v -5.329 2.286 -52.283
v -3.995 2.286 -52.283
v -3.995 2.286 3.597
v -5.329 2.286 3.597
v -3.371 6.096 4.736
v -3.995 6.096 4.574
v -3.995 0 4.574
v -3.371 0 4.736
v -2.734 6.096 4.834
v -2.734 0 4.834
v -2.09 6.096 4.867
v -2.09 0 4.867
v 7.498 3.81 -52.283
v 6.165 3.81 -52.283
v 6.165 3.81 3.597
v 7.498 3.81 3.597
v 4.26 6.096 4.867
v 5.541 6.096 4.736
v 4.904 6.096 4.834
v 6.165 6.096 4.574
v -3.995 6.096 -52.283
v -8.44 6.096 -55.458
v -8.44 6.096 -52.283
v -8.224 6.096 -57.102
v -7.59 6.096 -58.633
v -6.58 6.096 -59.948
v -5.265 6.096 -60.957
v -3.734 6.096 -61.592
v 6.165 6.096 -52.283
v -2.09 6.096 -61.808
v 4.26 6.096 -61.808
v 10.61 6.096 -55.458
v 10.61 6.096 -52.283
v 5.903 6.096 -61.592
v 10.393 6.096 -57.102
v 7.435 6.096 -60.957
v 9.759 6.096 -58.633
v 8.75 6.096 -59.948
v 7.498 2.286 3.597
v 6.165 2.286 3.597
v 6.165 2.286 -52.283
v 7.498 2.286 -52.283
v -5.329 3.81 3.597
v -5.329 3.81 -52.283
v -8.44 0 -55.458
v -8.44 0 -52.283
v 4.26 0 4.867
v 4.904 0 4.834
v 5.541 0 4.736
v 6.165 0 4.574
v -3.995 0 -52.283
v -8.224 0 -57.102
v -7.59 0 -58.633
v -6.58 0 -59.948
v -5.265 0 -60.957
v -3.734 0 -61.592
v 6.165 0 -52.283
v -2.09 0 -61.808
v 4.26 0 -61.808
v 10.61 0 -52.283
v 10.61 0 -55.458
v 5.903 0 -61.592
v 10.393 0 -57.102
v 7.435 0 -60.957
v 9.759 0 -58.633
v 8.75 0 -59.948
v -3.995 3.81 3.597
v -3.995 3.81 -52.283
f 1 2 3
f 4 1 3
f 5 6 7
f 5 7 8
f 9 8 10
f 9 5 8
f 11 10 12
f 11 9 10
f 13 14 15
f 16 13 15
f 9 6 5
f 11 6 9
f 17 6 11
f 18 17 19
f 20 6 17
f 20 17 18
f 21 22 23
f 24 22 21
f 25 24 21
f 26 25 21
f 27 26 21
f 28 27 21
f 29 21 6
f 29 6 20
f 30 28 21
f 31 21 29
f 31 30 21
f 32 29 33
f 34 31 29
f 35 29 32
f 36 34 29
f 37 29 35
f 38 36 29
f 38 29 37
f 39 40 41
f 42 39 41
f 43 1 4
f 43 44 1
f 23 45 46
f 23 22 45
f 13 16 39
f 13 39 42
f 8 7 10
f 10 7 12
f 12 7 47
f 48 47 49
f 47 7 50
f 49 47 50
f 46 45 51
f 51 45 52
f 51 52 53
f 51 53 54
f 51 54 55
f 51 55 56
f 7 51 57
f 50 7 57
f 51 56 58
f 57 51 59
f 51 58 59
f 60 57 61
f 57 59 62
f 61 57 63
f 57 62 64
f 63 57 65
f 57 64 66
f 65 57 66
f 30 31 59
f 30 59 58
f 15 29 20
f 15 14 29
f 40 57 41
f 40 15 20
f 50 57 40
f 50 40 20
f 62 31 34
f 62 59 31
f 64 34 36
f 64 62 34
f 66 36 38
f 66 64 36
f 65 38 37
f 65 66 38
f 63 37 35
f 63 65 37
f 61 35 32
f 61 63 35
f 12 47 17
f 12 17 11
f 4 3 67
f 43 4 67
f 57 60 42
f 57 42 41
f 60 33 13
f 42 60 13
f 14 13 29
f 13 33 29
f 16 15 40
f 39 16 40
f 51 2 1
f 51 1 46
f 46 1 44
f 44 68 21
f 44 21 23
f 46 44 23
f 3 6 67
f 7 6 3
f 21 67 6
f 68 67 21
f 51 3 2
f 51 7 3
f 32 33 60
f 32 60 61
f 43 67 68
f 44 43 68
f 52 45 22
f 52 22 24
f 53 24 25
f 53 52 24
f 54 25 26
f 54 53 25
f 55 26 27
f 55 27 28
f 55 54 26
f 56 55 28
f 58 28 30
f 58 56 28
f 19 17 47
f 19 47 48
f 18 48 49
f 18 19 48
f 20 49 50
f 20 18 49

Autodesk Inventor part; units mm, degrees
ref_plane "YZ Plane" through (0, 0, 0) normal (1, 0, 0) x (0, 1, 0)
ref_plane "XZ Plane" through (0, 0, 0) normal (0, 1, 0) x (-1, 0, 0)
ref_plane "XY Plane" through (0, 0, 0) normal (0, 0, 1) x (1, 0, 0)
sketch "Sketch1" plane through (0, 0, 0) normal (0, 1, 0) x (-1, 0, 0)
  line L0 (-6.1647, 4.8669) -> (3.9953, 4.8669)
  line L1 (3.9953, 4.8669) -> (3.9953, -52.2831)
  line L2 (3.9953, -52.2831) -> (-6.1647, -52.2831)
  line L3 (-6.1647, -52.2831) -> (-6.1647, 4.8669)
  point P0 (0, 0)
  dimension "d0" = 10.16
  dimension "d1" = 57.15
extrude "Extrusion1" add sketch "Sketch1" along normal blind 6.096
sketch "Sketch2" plane through (6.1647, 0, 4.8669) normal (1, 0, 0) x (0, 0, -1)
  point P0 (4.8669, 0)
sketch "Sketch3" plane through (6.1647, 0, 4.8669) normal (1, 0, 0) x (0, 0, -1)
  line L0 (0, 0) -> (0, 6.096) projected
  line L1 (0, 2.286) -> (57.15, 2.286)
  line L2 (57.15, 2.286) -> (57.15, 3.81)
  line L3 (57.15, 3.81) -> (0, 3.81)
  line L4 (0, 3.81) -> (0, 2.286)
  line L5 (57.15, 0) -> (0, 0) projected
  point P0 (4.8669, 0)
  dimension "d4" = 1.524
  dimension "d5" = 57.15
  dimension "d6" = 2.286
extrude "Extrusion2" add sketch "Sketch3" along normal blind 1.3335
ref_plane "Work Plane1" through (1.0847, 6.096, 4.8669) normal (1, 0, 0) x (0, 0, -1)
mirror "Mirror1" about plane through (1.0847, 6.096, 4.8669) normal (1, 0, 0) of "Extrusion2"
sketch "Sketch4" plane through (6.1647, 0, -52.2831) normal (0, 0, -1) x (-1, 0, 0)
  line L0 (-4.445, 0) -> (14.605, 0)
  line L1 (14.605, 0) -> (14.605, 6.096)
  line L2 (14.605, 6.096) -> (-4.445, 6.096)
  line L3 (-4.445, 6.096) -> (-4.445, 0)
  line L4 (11.4935, 2.286) -> (11.4935, 3.81) projected
  line L5 (0, 6.096) -> (10.16, 6.096) projected
  line L6 (5.08, -1.2192) -> (5.08, 7.3152) projected
  point P0 (6.1647, 0)
  dimension "d12" = 6.096
  dimension "d13" = 19.05
  dimension "d14" = 9.525
extrude "Extrusion3" add sketch "Sketch4" along normal blind 6.35
fillet "Fillet2" radius 6.35 2 edges at (10.6097, 3.048, -58.6331) (-8.4403, 3.048, -58.6331)
sketch "Sketch5" plane through (0, 6.096, 0) normal (0, 1, 0) x (1, 0, 0)
  line L0 (4.2597, 58.6331) -> (-2.0903, 58.6331) projected
  line L1 (4.2597, 58.6331) -> (4.2597, -15.5891) construction
  line L2 (6.1647, -4.8669) -> (-3.9953, -4.8669) projected
  arc A0 (4.2597, -4.8669) -> (10.4219, -0.0496) centre (4.2597, 1.4831) ccw
  line L3 (11.5575, 1.4831) -> (7.7347, 1.4831) construction
  line L4 (10.4219, -0.0496) -> (12.4924, -6.8649)
  line L5 (12.4924, -6.8649) -> (5.3123, -7.0975)
  line L6 (5.3123, -7.0975) -> (4.2597, -4.8669)
  point P0 (0, 0)
  dimension "d16" = 6.35
extrude "Extrusion4" cut sketch "Sketch5" against normal blind 7.62
mirror "Mirror2" about plane through (1.0847, 6.096, 4.8669) normal (1, 0, 0) of "Extrusion4"
sketch "Sketch6" plane through (-3.9953, 3.81, -52.2831) normal (-1, 0, 0) x (0, 0, 1)
  line L0 (55.88, 6.0179) -> (62.6058, 6.0179)
  line L1 (62.6058, 6.0179) -> (62.6058, -10.0967)
  line L2 (62.6058, -10.0967) -> (55.88, -10.0967)
  line L3 (55.88, -10.0967) -> (55.88, 6.0179)
  line L4 (0, -3.81) -> (0, 2.286) projected
  point P0 (52.2831, -3.81)
  dimension "d19" = 55.88
extrude "Extrusion5" cut sketch "Sketch6" along normal blind 7.62
mirror "Mirror3" about plane through (1.0847, 6.096, 4.8669) normal (1, 0, 0) of "Extrusion5"
sketch "Sketch7" plane through (0, 6.096, 0) normal (0, 1, 0) x (1, 0, 0)
  line L0 (-8.4403, 52.2831) -> (10.6097, 52.2831)
  line L1 (10.6097, 52.2831) -> (10.6097, 61.8081)
  line L2 (10.6097, 61.8081) -> (-8.4403, 61.8081)
  line L3 (-8.4403, 61.8081) -> (-8.4403, 52.2831)
  point P0 (0, 0)
  dimension "d22" = 19.05
  dimension "d23" = 9.525
extrude "Extrusion6" add sketch "Sketch7" against normal blind 6.096
fillet "Fillet3" radius 6.35 2 edges at (10.6097, 3.048, -61.8081) (-8.4403, 3.048, -61.8081)
properties part number "Marcus' Case Clip"
